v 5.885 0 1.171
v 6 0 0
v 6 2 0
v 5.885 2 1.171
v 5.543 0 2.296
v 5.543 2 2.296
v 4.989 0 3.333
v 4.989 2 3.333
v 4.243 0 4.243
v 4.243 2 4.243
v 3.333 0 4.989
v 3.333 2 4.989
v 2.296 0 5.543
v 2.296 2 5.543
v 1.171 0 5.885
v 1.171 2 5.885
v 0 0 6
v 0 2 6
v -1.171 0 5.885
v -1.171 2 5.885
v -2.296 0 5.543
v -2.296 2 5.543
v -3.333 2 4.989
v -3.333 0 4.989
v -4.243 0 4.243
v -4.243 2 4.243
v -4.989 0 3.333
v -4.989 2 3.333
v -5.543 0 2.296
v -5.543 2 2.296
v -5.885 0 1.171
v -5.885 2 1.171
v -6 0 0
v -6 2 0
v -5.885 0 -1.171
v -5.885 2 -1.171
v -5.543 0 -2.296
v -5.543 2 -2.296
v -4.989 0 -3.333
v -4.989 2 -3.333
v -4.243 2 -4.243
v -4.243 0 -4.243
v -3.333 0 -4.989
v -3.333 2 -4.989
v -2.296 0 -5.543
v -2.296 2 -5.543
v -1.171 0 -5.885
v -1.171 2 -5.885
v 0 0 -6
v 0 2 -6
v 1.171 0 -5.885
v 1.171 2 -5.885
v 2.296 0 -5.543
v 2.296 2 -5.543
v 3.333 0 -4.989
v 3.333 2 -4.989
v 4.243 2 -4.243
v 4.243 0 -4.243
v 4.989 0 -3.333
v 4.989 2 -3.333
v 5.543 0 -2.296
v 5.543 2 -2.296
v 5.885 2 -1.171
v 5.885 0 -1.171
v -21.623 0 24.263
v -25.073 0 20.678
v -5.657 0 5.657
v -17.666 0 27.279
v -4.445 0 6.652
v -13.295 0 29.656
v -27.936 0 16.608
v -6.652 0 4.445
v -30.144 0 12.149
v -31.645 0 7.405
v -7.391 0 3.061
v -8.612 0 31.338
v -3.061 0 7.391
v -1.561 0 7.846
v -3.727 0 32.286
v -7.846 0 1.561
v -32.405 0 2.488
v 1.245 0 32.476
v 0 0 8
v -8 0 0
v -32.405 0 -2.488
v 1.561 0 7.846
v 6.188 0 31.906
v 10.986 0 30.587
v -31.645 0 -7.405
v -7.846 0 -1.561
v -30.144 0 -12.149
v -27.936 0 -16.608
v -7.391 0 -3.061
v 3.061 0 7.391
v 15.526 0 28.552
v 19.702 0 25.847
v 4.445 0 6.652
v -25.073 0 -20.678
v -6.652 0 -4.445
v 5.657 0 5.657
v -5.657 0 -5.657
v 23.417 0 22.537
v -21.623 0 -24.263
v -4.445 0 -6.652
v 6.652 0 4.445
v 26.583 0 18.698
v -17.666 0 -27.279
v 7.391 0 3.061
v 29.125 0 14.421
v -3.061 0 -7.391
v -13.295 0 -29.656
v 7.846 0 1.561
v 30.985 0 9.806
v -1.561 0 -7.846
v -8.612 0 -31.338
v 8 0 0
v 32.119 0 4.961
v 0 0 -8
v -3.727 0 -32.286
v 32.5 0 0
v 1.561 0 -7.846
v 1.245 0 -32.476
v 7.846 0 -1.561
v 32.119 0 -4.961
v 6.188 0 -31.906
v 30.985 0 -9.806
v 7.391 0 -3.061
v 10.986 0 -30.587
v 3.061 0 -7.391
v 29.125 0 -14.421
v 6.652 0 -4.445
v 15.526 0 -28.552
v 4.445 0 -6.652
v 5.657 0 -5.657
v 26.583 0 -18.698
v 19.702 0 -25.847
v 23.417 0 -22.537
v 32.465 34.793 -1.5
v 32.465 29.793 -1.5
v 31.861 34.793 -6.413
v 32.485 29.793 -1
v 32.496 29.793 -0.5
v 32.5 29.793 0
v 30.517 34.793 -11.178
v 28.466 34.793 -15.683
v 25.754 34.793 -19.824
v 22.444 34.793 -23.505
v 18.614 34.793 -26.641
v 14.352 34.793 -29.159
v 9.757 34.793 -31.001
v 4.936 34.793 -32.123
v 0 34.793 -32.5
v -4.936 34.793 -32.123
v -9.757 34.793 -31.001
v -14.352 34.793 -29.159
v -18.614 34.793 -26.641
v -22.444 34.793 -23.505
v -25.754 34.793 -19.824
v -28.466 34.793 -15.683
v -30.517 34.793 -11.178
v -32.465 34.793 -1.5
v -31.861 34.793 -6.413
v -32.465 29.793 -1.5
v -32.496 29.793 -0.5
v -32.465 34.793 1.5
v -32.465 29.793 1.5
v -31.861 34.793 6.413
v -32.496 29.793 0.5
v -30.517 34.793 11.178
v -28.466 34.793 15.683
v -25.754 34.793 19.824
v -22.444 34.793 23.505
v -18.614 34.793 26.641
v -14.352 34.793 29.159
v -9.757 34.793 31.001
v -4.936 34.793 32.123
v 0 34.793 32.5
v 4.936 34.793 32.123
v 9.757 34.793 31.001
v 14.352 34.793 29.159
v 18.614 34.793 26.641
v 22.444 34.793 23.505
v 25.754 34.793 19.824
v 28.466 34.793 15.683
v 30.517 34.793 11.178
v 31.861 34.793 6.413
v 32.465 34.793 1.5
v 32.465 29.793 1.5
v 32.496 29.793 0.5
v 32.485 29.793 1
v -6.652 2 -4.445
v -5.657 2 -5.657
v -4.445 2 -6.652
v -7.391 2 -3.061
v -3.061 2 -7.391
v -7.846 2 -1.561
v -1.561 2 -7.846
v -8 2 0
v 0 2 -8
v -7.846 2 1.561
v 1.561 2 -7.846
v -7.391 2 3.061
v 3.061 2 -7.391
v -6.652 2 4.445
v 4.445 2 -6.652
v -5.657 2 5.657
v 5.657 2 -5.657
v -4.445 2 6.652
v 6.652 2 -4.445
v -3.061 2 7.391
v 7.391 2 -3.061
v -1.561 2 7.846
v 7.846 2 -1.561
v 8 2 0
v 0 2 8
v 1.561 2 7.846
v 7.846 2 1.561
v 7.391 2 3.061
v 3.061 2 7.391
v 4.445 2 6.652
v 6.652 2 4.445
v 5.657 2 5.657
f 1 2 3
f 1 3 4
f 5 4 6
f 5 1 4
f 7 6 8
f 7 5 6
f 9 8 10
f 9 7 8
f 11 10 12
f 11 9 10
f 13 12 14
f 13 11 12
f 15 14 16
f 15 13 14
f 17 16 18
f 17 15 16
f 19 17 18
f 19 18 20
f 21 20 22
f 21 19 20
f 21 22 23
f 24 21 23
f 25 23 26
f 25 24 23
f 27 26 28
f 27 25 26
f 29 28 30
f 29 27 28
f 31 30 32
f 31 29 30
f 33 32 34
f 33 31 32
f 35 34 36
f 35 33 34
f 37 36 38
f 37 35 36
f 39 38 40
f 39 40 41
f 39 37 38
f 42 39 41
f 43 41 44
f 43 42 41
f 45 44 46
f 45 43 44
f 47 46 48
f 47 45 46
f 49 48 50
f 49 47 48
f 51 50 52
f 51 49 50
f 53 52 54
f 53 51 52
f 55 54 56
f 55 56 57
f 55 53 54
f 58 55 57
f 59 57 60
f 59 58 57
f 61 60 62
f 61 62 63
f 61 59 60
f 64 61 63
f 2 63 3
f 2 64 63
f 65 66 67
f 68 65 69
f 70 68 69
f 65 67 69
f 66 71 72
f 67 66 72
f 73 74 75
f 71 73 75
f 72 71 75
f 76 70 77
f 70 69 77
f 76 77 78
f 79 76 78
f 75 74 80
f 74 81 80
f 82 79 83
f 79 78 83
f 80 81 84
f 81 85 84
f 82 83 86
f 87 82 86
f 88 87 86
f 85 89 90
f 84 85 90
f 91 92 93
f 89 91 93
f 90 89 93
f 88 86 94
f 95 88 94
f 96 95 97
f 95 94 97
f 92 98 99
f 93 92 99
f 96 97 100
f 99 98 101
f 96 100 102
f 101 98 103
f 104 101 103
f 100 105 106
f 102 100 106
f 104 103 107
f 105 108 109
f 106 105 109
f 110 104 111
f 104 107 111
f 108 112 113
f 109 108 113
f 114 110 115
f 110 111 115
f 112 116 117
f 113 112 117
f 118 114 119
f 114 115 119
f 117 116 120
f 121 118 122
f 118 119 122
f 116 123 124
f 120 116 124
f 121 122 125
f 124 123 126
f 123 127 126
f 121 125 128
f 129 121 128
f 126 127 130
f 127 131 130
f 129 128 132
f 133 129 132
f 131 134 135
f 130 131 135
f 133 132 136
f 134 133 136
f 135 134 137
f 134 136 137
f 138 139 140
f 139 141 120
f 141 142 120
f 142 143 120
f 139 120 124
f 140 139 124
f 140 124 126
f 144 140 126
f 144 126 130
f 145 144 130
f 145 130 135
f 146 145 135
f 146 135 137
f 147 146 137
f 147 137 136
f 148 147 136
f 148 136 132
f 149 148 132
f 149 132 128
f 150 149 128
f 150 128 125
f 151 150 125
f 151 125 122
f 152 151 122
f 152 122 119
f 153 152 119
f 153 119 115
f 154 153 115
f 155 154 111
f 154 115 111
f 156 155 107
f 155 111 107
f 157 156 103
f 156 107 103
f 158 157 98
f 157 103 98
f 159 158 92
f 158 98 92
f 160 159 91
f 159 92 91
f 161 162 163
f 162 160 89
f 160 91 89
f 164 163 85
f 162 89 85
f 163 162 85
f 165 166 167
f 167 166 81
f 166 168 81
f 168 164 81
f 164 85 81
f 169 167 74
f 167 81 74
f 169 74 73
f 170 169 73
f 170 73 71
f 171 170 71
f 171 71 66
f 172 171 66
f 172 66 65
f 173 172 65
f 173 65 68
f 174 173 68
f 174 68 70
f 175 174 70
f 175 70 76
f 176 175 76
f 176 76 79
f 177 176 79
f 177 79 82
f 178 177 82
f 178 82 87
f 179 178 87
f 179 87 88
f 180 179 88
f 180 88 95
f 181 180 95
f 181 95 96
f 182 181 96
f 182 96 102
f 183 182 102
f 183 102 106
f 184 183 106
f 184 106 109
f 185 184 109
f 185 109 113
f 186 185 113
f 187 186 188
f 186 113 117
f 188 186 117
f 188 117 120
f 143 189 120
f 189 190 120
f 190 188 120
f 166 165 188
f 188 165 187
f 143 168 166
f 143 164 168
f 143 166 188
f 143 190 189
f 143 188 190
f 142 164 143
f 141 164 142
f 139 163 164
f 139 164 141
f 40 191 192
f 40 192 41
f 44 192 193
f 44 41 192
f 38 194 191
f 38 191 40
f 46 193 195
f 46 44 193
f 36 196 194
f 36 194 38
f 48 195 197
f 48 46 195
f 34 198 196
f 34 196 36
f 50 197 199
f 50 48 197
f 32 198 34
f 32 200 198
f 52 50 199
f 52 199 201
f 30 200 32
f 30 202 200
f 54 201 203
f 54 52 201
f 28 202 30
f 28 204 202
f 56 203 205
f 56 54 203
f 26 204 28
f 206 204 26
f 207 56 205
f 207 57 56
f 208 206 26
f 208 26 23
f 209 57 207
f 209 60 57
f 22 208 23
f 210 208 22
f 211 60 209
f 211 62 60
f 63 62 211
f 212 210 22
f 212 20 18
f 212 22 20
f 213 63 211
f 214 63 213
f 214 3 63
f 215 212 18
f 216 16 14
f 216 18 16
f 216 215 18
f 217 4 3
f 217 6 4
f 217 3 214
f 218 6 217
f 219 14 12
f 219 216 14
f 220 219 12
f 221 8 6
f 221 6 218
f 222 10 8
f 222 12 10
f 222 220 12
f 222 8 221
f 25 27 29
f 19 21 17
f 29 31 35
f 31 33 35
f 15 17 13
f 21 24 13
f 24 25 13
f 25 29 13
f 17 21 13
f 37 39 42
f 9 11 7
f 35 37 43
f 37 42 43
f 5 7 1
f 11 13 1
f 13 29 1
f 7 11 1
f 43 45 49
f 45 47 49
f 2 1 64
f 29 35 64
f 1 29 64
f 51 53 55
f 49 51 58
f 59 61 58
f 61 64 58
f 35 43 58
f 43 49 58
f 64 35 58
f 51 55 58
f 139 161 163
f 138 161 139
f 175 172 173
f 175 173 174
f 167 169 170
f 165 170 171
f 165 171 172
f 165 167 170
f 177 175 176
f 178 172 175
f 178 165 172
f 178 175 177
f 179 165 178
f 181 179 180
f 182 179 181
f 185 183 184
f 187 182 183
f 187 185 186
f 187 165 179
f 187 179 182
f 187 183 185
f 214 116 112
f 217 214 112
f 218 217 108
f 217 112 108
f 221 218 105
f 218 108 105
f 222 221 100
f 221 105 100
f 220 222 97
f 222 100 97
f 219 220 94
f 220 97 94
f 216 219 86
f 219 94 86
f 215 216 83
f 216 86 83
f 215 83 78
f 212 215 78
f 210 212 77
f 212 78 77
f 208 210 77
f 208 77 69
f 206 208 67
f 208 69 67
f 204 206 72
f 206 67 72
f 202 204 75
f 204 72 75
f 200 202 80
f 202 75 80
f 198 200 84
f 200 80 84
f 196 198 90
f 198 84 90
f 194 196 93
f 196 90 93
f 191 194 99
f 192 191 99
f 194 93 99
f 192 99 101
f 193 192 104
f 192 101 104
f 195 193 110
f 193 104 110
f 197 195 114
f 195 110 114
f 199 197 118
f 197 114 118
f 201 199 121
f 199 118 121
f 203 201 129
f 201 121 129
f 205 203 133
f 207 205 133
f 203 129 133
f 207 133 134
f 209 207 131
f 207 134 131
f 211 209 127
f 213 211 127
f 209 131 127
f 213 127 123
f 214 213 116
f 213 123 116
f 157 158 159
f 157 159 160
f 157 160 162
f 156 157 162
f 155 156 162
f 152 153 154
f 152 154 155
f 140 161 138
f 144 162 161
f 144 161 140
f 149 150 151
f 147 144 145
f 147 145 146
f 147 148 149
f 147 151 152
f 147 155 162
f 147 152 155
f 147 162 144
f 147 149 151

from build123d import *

# Parameters (mm, degrees)
SKETCH1_R           = 32.5
BOSS_EXTRUDE1_DEPTH = 34.793
SKETCH4_W           = 66.380152204
SKETCH4_H           = 3
CUT_EXTRUDE1_DEPTH  = 5
SKETCH5_R           = 8
SKETCH5_R_2         = 6
CUT_EXTRUDE2_DEPTH  = 2


with BuildPart() as part:
    # Sketch1 → Boss-Extrude1 (new body)
    with BuildSketch(Plane(origin=(0, 0, 0), x_dir=(1, 0, 0), z_dir=(0, 1, 0))):
        Circle(SKETCH1_R)
    extrude(amount=BOSS_EXTRUDE1_DEPTH)

    # Sketch4 → Cut-Extrude1 (cut)
    with BuildSketch(Plane(origin=(0, 34.793, 0), x_dir=(1, 0, 0), z_dir=(0, 1, 0))):
        Rectangle(SKETCH4_W, SKETCH4_H)
    extrude(amount=-CUT_EXTRUDE1_DEPTH, mode=Mode.SUBTRACT)

    # Sketch5 → Cut-Extrude2 (cut)
    with BuildSketch(Plane.XZ):
        Circle(SKETCH5_R)
        Circle(SKETCH5_R_2, mode=Mode.SUBTRACT)
    extrude(amount=-CUT_EXTRUDE2_DEPTH, mode=Mode.SUBTRACT)


solid = part.part
